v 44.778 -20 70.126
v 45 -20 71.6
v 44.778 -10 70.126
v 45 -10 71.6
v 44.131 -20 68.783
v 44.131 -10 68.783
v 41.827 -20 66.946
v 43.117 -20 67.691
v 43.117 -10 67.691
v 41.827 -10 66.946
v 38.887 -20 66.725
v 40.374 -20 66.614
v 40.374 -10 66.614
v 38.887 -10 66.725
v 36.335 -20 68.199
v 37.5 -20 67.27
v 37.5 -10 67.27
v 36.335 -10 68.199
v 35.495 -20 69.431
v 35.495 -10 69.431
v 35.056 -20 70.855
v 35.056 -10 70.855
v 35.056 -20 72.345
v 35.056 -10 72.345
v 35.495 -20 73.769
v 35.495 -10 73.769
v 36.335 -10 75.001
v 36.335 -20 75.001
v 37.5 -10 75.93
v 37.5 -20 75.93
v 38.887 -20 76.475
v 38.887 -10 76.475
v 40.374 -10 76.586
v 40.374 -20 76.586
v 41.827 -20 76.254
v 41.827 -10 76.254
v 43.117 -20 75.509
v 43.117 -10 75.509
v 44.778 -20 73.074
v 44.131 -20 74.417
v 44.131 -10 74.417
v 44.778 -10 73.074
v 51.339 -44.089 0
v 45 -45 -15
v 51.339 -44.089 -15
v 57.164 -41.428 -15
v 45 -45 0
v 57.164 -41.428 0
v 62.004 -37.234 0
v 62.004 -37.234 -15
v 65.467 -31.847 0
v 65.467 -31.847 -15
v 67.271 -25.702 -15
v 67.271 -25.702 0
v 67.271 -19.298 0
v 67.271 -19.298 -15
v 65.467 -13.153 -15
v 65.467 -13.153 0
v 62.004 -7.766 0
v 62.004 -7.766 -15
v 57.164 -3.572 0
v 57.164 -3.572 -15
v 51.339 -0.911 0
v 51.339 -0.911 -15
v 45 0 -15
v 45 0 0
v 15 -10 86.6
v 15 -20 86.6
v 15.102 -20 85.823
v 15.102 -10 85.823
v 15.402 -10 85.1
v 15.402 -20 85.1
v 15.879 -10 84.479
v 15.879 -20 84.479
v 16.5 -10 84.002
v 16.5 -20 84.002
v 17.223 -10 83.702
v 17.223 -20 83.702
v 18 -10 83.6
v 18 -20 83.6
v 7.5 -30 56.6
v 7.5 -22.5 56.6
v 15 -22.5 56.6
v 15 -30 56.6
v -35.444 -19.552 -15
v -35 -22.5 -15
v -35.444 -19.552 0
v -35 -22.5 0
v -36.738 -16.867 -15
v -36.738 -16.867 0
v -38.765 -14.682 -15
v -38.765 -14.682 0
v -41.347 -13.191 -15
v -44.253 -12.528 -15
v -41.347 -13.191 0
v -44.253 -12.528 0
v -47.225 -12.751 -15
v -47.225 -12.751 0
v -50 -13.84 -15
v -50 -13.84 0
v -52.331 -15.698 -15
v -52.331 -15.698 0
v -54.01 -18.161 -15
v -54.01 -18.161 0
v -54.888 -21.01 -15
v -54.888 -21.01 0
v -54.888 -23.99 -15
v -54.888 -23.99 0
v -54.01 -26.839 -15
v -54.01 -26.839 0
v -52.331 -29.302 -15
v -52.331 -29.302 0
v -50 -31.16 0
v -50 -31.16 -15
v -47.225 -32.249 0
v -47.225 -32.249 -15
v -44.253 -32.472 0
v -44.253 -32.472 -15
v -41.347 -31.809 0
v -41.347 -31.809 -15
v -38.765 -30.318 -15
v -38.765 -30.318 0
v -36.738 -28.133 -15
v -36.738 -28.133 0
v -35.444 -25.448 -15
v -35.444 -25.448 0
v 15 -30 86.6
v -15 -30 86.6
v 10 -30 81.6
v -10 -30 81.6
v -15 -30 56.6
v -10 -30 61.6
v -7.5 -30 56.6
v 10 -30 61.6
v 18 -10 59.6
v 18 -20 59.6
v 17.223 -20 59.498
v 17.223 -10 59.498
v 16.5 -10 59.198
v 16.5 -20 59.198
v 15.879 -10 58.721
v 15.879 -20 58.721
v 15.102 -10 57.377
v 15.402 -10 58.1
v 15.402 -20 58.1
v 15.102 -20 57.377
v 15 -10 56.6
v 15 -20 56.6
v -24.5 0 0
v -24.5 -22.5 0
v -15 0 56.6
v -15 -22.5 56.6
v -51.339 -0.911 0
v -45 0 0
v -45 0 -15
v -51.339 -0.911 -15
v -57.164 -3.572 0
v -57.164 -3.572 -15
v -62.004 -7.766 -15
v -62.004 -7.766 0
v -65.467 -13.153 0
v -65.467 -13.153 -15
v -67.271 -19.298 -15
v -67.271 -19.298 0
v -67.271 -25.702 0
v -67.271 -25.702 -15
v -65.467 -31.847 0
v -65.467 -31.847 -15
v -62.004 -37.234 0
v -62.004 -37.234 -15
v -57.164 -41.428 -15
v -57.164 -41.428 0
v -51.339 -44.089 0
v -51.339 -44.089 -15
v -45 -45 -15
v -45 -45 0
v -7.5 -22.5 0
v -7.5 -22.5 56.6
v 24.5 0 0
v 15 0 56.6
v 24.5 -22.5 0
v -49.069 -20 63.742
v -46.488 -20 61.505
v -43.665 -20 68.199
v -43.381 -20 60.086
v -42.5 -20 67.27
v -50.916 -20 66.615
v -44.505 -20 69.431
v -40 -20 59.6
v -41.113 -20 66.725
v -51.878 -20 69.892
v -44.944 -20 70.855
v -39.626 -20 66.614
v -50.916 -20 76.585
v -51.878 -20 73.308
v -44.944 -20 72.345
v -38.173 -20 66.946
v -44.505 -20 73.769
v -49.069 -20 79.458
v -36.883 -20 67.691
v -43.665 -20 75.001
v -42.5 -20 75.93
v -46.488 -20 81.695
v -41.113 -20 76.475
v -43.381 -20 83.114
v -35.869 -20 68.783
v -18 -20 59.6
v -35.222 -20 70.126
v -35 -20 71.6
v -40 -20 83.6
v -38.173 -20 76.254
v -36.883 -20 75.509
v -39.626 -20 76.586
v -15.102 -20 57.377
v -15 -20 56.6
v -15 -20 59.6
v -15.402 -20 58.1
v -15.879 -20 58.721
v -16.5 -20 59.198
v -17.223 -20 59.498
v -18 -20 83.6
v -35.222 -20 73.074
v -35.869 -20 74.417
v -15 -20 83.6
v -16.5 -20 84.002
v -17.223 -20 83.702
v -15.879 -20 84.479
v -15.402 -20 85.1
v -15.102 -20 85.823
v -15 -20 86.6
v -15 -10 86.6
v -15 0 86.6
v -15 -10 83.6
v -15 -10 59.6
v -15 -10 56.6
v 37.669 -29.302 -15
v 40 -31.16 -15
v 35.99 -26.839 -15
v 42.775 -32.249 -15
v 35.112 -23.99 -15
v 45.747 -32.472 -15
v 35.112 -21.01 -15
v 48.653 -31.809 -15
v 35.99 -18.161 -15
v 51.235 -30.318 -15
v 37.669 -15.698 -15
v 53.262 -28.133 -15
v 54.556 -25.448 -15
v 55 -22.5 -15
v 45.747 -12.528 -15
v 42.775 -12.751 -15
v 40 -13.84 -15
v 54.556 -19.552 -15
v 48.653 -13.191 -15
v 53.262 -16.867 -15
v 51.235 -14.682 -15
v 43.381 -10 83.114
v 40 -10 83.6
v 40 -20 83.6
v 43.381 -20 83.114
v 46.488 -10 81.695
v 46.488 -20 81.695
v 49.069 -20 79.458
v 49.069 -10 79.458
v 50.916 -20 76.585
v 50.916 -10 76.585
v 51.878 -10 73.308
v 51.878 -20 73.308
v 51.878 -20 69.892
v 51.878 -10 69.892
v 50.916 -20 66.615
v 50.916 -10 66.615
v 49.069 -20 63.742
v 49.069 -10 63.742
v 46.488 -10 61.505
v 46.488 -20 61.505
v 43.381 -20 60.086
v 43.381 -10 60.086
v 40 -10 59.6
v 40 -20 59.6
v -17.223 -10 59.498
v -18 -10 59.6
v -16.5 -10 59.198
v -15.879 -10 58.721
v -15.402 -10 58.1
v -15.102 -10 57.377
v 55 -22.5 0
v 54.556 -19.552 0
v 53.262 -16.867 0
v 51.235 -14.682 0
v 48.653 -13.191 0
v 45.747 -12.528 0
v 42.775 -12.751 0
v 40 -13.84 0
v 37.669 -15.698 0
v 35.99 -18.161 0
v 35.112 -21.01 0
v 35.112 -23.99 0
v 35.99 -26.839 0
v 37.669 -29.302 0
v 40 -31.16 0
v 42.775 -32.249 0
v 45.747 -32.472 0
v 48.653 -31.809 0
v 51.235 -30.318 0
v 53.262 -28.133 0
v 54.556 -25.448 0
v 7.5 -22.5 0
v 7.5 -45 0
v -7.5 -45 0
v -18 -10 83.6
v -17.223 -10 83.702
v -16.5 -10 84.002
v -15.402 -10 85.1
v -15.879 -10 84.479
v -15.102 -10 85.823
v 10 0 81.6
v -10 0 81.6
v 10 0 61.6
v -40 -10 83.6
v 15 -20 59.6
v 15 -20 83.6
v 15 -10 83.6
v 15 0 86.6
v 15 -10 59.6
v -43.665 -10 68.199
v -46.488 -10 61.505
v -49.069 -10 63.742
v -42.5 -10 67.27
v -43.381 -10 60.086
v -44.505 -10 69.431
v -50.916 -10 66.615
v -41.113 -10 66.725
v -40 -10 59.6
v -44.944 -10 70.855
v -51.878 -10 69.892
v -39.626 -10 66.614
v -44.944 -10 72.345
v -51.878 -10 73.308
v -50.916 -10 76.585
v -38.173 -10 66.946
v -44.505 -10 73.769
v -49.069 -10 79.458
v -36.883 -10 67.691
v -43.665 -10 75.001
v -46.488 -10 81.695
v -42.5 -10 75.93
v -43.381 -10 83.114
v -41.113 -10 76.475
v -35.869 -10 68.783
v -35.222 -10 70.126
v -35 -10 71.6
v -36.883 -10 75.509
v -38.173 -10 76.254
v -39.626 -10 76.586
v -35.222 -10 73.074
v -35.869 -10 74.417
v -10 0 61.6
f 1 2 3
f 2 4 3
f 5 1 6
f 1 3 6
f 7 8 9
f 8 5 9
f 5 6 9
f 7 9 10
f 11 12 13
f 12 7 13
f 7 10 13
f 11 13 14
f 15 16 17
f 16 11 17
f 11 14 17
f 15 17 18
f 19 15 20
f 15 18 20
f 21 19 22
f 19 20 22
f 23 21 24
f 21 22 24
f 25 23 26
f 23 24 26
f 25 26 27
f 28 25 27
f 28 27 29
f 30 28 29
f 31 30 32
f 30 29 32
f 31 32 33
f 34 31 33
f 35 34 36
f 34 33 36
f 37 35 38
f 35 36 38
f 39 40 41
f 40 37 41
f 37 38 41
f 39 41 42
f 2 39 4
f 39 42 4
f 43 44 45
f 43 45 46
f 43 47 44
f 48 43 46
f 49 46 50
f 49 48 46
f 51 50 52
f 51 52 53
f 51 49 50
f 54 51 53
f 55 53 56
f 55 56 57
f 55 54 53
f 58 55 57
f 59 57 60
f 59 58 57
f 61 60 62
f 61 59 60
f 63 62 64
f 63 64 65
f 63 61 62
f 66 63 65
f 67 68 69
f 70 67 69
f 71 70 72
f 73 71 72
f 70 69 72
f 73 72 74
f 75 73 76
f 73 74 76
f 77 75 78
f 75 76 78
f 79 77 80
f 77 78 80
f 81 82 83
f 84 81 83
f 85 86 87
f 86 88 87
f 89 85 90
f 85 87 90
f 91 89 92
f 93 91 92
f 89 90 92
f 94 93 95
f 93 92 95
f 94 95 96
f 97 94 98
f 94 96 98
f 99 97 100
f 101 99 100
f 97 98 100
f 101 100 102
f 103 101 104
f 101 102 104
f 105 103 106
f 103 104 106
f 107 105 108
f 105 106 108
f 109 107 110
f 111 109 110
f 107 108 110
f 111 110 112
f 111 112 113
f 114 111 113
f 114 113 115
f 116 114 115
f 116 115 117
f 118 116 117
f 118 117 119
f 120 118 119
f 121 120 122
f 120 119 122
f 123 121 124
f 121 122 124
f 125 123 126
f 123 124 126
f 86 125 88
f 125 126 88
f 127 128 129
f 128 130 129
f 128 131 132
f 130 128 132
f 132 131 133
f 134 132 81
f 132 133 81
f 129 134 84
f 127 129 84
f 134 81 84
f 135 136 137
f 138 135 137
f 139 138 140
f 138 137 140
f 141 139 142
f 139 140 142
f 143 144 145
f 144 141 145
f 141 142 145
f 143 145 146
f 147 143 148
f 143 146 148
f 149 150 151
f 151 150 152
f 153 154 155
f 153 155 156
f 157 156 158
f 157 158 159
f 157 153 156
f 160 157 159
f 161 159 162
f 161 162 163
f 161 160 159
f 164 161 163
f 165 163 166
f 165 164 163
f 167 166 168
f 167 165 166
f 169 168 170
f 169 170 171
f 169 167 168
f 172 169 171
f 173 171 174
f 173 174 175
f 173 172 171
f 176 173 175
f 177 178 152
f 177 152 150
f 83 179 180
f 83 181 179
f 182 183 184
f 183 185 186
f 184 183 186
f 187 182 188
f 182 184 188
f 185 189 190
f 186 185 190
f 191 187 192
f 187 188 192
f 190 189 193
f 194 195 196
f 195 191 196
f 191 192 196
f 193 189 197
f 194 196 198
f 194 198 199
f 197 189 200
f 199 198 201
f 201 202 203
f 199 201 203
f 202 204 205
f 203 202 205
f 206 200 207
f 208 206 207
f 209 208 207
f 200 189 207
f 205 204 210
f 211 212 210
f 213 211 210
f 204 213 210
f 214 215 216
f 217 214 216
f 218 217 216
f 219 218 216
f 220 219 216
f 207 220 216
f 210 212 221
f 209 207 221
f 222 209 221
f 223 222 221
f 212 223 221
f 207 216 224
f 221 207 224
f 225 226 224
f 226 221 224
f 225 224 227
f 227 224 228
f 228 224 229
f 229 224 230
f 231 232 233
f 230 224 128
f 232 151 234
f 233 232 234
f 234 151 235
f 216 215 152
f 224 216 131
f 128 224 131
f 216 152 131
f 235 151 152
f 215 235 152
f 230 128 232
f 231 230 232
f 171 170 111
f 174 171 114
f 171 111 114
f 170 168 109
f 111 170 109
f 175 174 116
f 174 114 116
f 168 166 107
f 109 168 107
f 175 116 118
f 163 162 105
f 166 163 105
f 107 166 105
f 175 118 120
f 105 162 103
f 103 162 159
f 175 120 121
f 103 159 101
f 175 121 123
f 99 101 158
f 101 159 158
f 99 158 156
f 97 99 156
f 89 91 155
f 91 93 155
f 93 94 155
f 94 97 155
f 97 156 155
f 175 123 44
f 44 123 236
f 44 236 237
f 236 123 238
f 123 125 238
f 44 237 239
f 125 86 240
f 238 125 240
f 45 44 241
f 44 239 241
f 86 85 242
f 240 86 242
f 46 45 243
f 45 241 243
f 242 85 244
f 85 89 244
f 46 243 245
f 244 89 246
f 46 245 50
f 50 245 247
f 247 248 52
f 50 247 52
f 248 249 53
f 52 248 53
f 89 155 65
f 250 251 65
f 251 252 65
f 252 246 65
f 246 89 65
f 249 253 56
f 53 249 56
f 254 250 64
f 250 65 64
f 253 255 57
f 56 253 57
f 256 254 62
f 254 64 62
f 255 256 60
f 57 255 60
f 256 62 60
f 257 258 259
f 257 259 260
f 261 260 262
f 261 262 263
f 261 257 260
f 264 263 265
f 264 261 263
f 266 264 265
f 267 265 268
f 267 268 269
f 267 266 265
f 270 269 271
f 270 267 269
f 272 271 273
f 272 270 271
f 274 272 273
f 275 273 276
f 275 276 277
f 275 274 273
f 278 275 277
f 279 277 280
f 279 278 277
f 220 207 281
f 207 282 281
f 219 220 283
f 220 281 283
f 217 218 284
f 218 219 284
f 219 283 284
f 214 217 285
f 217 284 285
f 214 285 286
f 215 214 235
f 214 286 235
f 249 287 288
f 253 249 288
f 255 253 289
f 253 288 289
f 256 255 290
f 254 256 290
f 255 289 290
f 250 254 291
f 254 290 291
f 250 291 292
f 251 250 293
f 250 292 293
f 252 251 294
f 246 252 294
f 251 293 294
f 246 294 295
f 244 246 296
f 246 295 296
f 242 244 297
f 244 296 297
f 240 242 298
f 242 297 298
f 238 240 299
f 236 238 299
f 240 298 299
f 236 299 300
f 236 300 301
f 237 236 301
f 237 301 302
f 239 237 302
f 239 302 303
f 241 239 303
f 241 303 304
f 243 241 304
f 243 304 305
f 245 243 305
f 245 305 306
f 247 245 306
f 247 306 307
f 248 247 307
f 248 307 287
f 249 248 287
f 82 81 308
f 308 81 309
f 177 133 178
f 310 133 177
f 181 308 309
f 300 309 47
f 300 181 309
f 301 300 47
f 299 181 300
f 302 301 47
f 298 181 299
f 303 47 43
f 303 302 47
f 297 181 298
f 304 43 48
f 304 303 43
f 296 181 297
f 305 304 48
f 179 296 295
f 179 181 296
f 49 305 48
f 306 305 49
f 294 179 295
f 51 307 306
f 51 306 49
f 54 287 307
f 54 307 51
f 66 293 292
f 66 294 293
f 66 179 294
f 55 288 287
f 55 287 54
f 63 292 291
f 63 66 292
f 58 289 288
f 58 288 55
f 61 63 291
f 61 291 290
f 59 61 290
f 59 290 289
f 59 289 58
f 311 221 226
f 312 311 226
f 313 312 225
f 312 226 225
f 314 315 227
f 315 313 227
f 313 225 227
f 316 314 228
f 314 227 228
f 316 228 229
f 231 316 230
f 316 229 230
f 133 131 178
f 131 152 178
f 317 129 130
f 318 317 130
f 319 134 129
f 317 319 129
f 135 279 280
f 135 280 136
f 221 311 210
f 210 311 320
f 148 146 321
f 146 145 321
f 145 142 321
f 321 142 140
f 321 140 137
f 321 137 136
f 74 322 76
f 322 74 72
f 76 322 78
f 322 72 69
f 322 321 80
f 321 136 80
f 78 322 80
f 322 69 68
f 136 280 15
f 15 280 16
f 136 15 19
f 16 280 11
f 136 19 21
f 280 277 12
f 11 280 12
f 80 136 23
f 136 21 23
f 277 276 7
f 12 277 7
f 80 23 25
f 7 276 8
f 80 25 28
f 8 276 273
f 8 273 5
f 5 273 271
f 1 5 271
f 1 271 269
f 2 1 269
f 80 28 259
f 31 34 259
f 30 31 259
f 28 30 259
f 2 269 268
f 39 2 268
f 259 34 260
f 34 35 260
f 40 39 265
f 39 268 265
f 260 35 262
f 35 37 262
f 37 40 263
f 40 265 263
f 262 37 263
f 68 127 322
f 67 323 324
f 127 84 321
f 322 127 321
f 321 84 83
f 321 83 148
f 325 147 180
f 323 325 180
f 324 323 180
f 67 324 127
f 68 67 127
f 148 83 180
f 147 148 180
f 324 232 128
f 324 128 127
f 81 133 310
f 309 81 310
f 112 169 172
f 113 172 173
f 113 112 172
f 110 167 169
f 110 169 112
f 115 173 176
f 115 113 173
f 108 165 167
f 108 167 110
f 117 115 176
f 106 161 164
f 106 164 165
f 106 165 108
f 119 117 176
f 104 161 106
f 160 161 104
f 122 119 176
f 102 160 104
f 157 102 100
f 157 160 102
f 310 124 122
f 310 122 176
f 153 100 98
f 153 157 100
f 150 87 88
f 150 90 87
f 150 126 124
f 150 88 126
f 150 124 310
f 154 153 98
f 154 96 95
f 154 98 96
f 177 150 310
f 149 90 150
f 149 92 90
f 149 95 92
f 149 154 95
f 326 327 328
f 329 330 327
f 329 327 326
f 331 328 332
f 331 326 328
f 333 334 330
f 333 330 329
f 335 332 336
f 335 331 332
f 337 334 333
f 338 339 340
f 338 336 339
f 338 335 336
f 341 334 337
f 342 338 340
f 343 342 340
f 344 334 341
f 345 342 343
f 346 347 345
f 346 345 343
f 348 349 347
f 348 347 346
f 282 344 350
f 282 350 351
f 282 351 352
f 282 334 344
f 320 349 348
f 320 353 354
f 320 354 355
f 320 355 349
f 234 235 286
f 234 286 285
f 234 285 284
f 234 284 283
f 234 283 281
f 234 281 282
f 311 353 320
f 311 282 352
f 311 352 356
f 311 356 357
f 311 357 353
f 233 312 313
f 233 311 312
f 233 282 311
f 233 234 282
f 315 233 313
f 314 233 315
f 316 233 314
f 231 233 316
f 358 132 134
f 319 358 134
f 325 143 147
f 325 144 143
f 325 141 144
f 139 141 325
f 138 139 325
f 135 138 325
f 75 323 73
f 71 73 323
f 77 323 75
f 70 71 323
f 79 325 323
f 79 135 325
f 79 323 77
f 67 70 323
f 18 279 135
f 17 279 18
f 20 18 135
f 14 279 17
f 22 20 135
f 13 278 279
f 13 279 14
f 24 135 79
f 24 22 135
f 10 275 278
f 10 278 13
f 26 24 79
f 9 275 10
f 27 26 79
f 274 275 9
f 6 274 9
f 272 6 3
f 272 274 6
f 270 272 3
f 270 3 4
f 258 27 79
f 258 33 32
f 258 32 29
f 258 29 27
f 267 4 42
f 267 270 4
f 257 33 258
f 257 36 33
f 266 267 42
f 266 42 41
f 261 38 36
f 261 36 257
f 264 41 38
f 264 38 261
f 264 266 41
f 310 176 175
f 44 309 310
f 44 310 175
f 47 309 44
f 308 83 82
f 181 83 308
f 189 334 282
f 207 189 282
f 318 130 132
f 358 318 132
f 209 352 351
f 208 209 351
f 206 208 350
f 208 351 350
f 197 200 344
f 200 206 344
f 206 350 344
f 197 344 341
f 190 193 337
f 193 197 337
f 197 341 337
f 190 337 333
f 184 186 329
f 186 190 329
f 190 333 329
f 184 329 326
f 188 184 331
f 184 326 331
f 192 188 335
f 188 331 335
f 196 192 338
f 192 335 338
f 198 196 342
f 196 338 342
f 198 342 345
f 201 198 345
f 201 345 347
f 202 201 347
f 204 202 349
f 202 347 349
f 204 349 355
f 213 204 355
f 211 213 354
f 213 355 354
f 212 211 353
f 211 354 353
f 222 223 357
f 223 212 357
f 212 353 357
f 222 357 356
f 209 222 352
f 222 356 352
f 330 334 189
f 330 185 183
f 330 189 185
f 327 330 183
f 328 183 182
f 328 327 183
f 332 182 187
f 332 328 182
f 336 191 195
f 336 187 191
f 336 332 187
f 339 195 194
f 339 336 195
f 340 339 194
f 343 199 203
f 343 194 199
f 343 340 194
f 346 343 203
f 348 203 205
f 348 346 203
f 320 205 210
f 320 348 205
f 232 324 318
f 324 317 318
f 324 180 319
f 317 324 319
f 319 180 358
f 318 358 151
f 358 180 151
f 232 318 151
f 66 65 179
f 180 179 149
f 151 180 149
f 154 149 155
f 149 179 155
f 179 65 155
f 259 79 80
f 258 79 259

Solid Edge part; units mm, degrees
sketch "Sketch1" plane through (0, 0, 0) normal (0, 0, 1) x (1, 0, 0)
  circle A0 centre (45, -22.5) radius 10
  arc A1 (-45, 0) -> (-45, -45) centre (-45, -22.5) ccw
  line L0 (-45, -45) -> (45, -45)
  arc A2 (45, -45) -> (45, 0) centre (45, -22.5) ccw
  line L1 (0, 0) -> (45, 0)
  line L2 (0, 0) -> (-45, 0)
  circle A3 centre (-45, -22.5) radius 10
extrude "Protrusion1" add sketch "Sketch1" against normal blind 15
sketch "Sketch2" plane through (0, 0, 71.6) normal (0, 0, 1) x (1, 0, 0)
  line L0 (15, -30) -> (15, 0)
  line L1 (15, 0) -> (-15, 0)
  line L2 (-15, 0) -> (-15, -30)
  line L3 (-15, -30) -> (15, -30)
extrude "ExtrudedProtrusion_2" add sketch "Sketch2" along normal mid plane 30
sketch "Sketch3" plane through (0, -30, 71.6) normal (0, -1, 0) x (1, 0, 0)
  line L0 (10, -10) -> (10, 10)
  line L1 (10, 10) -> (-10, 10)
  line L2 (-10, 10) -> (-10, -10)
  line L3 (-10, -10) -> (10, -10)
extrude "ExtrudedCutout_1" cut sketch "Sketch3" against normal blind 30
sketch "Sketch4" plane through (0, -15, 71.6) normal (0, -1, 0) x (1, 0, 0)
  line L0 (15, 12) -> (40, 12)
  arc A0 (40, 12) -> (40, -12) centre (40, 0) cw
  line L1 (40, -12) -> (15, -12)
  line L2 (15, 12) -> (15, -12)
  circle A1 centre (40, 0) radius 5
extrude "ExtrudedProtrusion_3" add sketch "Sketch4" along normal mid plane 10
sketch "Sketch5" plane through (0, -15, 71.6) normal (0, -1, 0) x (1, 0, 0)
  line L0 (-15, 12) -> (-15, -12)
  line L1 (-40, -12) -> (-15, -12)
  arc A0 (-40, 12) -> (-40, -12) centre (-40, 0) ccw
  line L2 (-15, 12) -> (-40, 12)
  circle A1 centre (-40, 0) radius 5
extrude "ExtrudedProtrusion_4" add sketch "Sketch5" along normal mid plane 10
sketch "Sketch6" plane through (0, 0, 0) normal (1, 0, 0) x (0, 1, 0)
  line L0 (-30, 56.6) -> (-22.5, 56.6)
  line L1 (-22.5, 0) -> (-22.5, 56.6)
  line L2 (-45, 0) -> (-22.5, 0)
  line L3 (-30, 56.6) -> (-45, 0)
extrude "ExtrudedProtrusion_5" add sketch "Sketch6" along normal mid plane 15
sketch "Sketch7" plane through (0, -22.5, 0) normal (0, -1, 0) x (1, 0, 0)
  line L0 (24.5, 0) -> (15, 56.6)
  line L1 (-15, 56.6) -> (15, 56.6)
  line L2 (-24.5, 0) -> (-15, 56.6)
  line L3 (0, 0) -> (-24.5, 0)
  line L4 (0, 0) -> (24.5, 0)
extrude "ExtrudedProtrusion_6" add sketch "Sketch7" against normal blind 22.5
fillet "Round_1" radius 3 4 edges at (15, -15, 83.6) (-15, -15, 83.6) (15, -15, 59.6) (-15, -15, 59.6)
